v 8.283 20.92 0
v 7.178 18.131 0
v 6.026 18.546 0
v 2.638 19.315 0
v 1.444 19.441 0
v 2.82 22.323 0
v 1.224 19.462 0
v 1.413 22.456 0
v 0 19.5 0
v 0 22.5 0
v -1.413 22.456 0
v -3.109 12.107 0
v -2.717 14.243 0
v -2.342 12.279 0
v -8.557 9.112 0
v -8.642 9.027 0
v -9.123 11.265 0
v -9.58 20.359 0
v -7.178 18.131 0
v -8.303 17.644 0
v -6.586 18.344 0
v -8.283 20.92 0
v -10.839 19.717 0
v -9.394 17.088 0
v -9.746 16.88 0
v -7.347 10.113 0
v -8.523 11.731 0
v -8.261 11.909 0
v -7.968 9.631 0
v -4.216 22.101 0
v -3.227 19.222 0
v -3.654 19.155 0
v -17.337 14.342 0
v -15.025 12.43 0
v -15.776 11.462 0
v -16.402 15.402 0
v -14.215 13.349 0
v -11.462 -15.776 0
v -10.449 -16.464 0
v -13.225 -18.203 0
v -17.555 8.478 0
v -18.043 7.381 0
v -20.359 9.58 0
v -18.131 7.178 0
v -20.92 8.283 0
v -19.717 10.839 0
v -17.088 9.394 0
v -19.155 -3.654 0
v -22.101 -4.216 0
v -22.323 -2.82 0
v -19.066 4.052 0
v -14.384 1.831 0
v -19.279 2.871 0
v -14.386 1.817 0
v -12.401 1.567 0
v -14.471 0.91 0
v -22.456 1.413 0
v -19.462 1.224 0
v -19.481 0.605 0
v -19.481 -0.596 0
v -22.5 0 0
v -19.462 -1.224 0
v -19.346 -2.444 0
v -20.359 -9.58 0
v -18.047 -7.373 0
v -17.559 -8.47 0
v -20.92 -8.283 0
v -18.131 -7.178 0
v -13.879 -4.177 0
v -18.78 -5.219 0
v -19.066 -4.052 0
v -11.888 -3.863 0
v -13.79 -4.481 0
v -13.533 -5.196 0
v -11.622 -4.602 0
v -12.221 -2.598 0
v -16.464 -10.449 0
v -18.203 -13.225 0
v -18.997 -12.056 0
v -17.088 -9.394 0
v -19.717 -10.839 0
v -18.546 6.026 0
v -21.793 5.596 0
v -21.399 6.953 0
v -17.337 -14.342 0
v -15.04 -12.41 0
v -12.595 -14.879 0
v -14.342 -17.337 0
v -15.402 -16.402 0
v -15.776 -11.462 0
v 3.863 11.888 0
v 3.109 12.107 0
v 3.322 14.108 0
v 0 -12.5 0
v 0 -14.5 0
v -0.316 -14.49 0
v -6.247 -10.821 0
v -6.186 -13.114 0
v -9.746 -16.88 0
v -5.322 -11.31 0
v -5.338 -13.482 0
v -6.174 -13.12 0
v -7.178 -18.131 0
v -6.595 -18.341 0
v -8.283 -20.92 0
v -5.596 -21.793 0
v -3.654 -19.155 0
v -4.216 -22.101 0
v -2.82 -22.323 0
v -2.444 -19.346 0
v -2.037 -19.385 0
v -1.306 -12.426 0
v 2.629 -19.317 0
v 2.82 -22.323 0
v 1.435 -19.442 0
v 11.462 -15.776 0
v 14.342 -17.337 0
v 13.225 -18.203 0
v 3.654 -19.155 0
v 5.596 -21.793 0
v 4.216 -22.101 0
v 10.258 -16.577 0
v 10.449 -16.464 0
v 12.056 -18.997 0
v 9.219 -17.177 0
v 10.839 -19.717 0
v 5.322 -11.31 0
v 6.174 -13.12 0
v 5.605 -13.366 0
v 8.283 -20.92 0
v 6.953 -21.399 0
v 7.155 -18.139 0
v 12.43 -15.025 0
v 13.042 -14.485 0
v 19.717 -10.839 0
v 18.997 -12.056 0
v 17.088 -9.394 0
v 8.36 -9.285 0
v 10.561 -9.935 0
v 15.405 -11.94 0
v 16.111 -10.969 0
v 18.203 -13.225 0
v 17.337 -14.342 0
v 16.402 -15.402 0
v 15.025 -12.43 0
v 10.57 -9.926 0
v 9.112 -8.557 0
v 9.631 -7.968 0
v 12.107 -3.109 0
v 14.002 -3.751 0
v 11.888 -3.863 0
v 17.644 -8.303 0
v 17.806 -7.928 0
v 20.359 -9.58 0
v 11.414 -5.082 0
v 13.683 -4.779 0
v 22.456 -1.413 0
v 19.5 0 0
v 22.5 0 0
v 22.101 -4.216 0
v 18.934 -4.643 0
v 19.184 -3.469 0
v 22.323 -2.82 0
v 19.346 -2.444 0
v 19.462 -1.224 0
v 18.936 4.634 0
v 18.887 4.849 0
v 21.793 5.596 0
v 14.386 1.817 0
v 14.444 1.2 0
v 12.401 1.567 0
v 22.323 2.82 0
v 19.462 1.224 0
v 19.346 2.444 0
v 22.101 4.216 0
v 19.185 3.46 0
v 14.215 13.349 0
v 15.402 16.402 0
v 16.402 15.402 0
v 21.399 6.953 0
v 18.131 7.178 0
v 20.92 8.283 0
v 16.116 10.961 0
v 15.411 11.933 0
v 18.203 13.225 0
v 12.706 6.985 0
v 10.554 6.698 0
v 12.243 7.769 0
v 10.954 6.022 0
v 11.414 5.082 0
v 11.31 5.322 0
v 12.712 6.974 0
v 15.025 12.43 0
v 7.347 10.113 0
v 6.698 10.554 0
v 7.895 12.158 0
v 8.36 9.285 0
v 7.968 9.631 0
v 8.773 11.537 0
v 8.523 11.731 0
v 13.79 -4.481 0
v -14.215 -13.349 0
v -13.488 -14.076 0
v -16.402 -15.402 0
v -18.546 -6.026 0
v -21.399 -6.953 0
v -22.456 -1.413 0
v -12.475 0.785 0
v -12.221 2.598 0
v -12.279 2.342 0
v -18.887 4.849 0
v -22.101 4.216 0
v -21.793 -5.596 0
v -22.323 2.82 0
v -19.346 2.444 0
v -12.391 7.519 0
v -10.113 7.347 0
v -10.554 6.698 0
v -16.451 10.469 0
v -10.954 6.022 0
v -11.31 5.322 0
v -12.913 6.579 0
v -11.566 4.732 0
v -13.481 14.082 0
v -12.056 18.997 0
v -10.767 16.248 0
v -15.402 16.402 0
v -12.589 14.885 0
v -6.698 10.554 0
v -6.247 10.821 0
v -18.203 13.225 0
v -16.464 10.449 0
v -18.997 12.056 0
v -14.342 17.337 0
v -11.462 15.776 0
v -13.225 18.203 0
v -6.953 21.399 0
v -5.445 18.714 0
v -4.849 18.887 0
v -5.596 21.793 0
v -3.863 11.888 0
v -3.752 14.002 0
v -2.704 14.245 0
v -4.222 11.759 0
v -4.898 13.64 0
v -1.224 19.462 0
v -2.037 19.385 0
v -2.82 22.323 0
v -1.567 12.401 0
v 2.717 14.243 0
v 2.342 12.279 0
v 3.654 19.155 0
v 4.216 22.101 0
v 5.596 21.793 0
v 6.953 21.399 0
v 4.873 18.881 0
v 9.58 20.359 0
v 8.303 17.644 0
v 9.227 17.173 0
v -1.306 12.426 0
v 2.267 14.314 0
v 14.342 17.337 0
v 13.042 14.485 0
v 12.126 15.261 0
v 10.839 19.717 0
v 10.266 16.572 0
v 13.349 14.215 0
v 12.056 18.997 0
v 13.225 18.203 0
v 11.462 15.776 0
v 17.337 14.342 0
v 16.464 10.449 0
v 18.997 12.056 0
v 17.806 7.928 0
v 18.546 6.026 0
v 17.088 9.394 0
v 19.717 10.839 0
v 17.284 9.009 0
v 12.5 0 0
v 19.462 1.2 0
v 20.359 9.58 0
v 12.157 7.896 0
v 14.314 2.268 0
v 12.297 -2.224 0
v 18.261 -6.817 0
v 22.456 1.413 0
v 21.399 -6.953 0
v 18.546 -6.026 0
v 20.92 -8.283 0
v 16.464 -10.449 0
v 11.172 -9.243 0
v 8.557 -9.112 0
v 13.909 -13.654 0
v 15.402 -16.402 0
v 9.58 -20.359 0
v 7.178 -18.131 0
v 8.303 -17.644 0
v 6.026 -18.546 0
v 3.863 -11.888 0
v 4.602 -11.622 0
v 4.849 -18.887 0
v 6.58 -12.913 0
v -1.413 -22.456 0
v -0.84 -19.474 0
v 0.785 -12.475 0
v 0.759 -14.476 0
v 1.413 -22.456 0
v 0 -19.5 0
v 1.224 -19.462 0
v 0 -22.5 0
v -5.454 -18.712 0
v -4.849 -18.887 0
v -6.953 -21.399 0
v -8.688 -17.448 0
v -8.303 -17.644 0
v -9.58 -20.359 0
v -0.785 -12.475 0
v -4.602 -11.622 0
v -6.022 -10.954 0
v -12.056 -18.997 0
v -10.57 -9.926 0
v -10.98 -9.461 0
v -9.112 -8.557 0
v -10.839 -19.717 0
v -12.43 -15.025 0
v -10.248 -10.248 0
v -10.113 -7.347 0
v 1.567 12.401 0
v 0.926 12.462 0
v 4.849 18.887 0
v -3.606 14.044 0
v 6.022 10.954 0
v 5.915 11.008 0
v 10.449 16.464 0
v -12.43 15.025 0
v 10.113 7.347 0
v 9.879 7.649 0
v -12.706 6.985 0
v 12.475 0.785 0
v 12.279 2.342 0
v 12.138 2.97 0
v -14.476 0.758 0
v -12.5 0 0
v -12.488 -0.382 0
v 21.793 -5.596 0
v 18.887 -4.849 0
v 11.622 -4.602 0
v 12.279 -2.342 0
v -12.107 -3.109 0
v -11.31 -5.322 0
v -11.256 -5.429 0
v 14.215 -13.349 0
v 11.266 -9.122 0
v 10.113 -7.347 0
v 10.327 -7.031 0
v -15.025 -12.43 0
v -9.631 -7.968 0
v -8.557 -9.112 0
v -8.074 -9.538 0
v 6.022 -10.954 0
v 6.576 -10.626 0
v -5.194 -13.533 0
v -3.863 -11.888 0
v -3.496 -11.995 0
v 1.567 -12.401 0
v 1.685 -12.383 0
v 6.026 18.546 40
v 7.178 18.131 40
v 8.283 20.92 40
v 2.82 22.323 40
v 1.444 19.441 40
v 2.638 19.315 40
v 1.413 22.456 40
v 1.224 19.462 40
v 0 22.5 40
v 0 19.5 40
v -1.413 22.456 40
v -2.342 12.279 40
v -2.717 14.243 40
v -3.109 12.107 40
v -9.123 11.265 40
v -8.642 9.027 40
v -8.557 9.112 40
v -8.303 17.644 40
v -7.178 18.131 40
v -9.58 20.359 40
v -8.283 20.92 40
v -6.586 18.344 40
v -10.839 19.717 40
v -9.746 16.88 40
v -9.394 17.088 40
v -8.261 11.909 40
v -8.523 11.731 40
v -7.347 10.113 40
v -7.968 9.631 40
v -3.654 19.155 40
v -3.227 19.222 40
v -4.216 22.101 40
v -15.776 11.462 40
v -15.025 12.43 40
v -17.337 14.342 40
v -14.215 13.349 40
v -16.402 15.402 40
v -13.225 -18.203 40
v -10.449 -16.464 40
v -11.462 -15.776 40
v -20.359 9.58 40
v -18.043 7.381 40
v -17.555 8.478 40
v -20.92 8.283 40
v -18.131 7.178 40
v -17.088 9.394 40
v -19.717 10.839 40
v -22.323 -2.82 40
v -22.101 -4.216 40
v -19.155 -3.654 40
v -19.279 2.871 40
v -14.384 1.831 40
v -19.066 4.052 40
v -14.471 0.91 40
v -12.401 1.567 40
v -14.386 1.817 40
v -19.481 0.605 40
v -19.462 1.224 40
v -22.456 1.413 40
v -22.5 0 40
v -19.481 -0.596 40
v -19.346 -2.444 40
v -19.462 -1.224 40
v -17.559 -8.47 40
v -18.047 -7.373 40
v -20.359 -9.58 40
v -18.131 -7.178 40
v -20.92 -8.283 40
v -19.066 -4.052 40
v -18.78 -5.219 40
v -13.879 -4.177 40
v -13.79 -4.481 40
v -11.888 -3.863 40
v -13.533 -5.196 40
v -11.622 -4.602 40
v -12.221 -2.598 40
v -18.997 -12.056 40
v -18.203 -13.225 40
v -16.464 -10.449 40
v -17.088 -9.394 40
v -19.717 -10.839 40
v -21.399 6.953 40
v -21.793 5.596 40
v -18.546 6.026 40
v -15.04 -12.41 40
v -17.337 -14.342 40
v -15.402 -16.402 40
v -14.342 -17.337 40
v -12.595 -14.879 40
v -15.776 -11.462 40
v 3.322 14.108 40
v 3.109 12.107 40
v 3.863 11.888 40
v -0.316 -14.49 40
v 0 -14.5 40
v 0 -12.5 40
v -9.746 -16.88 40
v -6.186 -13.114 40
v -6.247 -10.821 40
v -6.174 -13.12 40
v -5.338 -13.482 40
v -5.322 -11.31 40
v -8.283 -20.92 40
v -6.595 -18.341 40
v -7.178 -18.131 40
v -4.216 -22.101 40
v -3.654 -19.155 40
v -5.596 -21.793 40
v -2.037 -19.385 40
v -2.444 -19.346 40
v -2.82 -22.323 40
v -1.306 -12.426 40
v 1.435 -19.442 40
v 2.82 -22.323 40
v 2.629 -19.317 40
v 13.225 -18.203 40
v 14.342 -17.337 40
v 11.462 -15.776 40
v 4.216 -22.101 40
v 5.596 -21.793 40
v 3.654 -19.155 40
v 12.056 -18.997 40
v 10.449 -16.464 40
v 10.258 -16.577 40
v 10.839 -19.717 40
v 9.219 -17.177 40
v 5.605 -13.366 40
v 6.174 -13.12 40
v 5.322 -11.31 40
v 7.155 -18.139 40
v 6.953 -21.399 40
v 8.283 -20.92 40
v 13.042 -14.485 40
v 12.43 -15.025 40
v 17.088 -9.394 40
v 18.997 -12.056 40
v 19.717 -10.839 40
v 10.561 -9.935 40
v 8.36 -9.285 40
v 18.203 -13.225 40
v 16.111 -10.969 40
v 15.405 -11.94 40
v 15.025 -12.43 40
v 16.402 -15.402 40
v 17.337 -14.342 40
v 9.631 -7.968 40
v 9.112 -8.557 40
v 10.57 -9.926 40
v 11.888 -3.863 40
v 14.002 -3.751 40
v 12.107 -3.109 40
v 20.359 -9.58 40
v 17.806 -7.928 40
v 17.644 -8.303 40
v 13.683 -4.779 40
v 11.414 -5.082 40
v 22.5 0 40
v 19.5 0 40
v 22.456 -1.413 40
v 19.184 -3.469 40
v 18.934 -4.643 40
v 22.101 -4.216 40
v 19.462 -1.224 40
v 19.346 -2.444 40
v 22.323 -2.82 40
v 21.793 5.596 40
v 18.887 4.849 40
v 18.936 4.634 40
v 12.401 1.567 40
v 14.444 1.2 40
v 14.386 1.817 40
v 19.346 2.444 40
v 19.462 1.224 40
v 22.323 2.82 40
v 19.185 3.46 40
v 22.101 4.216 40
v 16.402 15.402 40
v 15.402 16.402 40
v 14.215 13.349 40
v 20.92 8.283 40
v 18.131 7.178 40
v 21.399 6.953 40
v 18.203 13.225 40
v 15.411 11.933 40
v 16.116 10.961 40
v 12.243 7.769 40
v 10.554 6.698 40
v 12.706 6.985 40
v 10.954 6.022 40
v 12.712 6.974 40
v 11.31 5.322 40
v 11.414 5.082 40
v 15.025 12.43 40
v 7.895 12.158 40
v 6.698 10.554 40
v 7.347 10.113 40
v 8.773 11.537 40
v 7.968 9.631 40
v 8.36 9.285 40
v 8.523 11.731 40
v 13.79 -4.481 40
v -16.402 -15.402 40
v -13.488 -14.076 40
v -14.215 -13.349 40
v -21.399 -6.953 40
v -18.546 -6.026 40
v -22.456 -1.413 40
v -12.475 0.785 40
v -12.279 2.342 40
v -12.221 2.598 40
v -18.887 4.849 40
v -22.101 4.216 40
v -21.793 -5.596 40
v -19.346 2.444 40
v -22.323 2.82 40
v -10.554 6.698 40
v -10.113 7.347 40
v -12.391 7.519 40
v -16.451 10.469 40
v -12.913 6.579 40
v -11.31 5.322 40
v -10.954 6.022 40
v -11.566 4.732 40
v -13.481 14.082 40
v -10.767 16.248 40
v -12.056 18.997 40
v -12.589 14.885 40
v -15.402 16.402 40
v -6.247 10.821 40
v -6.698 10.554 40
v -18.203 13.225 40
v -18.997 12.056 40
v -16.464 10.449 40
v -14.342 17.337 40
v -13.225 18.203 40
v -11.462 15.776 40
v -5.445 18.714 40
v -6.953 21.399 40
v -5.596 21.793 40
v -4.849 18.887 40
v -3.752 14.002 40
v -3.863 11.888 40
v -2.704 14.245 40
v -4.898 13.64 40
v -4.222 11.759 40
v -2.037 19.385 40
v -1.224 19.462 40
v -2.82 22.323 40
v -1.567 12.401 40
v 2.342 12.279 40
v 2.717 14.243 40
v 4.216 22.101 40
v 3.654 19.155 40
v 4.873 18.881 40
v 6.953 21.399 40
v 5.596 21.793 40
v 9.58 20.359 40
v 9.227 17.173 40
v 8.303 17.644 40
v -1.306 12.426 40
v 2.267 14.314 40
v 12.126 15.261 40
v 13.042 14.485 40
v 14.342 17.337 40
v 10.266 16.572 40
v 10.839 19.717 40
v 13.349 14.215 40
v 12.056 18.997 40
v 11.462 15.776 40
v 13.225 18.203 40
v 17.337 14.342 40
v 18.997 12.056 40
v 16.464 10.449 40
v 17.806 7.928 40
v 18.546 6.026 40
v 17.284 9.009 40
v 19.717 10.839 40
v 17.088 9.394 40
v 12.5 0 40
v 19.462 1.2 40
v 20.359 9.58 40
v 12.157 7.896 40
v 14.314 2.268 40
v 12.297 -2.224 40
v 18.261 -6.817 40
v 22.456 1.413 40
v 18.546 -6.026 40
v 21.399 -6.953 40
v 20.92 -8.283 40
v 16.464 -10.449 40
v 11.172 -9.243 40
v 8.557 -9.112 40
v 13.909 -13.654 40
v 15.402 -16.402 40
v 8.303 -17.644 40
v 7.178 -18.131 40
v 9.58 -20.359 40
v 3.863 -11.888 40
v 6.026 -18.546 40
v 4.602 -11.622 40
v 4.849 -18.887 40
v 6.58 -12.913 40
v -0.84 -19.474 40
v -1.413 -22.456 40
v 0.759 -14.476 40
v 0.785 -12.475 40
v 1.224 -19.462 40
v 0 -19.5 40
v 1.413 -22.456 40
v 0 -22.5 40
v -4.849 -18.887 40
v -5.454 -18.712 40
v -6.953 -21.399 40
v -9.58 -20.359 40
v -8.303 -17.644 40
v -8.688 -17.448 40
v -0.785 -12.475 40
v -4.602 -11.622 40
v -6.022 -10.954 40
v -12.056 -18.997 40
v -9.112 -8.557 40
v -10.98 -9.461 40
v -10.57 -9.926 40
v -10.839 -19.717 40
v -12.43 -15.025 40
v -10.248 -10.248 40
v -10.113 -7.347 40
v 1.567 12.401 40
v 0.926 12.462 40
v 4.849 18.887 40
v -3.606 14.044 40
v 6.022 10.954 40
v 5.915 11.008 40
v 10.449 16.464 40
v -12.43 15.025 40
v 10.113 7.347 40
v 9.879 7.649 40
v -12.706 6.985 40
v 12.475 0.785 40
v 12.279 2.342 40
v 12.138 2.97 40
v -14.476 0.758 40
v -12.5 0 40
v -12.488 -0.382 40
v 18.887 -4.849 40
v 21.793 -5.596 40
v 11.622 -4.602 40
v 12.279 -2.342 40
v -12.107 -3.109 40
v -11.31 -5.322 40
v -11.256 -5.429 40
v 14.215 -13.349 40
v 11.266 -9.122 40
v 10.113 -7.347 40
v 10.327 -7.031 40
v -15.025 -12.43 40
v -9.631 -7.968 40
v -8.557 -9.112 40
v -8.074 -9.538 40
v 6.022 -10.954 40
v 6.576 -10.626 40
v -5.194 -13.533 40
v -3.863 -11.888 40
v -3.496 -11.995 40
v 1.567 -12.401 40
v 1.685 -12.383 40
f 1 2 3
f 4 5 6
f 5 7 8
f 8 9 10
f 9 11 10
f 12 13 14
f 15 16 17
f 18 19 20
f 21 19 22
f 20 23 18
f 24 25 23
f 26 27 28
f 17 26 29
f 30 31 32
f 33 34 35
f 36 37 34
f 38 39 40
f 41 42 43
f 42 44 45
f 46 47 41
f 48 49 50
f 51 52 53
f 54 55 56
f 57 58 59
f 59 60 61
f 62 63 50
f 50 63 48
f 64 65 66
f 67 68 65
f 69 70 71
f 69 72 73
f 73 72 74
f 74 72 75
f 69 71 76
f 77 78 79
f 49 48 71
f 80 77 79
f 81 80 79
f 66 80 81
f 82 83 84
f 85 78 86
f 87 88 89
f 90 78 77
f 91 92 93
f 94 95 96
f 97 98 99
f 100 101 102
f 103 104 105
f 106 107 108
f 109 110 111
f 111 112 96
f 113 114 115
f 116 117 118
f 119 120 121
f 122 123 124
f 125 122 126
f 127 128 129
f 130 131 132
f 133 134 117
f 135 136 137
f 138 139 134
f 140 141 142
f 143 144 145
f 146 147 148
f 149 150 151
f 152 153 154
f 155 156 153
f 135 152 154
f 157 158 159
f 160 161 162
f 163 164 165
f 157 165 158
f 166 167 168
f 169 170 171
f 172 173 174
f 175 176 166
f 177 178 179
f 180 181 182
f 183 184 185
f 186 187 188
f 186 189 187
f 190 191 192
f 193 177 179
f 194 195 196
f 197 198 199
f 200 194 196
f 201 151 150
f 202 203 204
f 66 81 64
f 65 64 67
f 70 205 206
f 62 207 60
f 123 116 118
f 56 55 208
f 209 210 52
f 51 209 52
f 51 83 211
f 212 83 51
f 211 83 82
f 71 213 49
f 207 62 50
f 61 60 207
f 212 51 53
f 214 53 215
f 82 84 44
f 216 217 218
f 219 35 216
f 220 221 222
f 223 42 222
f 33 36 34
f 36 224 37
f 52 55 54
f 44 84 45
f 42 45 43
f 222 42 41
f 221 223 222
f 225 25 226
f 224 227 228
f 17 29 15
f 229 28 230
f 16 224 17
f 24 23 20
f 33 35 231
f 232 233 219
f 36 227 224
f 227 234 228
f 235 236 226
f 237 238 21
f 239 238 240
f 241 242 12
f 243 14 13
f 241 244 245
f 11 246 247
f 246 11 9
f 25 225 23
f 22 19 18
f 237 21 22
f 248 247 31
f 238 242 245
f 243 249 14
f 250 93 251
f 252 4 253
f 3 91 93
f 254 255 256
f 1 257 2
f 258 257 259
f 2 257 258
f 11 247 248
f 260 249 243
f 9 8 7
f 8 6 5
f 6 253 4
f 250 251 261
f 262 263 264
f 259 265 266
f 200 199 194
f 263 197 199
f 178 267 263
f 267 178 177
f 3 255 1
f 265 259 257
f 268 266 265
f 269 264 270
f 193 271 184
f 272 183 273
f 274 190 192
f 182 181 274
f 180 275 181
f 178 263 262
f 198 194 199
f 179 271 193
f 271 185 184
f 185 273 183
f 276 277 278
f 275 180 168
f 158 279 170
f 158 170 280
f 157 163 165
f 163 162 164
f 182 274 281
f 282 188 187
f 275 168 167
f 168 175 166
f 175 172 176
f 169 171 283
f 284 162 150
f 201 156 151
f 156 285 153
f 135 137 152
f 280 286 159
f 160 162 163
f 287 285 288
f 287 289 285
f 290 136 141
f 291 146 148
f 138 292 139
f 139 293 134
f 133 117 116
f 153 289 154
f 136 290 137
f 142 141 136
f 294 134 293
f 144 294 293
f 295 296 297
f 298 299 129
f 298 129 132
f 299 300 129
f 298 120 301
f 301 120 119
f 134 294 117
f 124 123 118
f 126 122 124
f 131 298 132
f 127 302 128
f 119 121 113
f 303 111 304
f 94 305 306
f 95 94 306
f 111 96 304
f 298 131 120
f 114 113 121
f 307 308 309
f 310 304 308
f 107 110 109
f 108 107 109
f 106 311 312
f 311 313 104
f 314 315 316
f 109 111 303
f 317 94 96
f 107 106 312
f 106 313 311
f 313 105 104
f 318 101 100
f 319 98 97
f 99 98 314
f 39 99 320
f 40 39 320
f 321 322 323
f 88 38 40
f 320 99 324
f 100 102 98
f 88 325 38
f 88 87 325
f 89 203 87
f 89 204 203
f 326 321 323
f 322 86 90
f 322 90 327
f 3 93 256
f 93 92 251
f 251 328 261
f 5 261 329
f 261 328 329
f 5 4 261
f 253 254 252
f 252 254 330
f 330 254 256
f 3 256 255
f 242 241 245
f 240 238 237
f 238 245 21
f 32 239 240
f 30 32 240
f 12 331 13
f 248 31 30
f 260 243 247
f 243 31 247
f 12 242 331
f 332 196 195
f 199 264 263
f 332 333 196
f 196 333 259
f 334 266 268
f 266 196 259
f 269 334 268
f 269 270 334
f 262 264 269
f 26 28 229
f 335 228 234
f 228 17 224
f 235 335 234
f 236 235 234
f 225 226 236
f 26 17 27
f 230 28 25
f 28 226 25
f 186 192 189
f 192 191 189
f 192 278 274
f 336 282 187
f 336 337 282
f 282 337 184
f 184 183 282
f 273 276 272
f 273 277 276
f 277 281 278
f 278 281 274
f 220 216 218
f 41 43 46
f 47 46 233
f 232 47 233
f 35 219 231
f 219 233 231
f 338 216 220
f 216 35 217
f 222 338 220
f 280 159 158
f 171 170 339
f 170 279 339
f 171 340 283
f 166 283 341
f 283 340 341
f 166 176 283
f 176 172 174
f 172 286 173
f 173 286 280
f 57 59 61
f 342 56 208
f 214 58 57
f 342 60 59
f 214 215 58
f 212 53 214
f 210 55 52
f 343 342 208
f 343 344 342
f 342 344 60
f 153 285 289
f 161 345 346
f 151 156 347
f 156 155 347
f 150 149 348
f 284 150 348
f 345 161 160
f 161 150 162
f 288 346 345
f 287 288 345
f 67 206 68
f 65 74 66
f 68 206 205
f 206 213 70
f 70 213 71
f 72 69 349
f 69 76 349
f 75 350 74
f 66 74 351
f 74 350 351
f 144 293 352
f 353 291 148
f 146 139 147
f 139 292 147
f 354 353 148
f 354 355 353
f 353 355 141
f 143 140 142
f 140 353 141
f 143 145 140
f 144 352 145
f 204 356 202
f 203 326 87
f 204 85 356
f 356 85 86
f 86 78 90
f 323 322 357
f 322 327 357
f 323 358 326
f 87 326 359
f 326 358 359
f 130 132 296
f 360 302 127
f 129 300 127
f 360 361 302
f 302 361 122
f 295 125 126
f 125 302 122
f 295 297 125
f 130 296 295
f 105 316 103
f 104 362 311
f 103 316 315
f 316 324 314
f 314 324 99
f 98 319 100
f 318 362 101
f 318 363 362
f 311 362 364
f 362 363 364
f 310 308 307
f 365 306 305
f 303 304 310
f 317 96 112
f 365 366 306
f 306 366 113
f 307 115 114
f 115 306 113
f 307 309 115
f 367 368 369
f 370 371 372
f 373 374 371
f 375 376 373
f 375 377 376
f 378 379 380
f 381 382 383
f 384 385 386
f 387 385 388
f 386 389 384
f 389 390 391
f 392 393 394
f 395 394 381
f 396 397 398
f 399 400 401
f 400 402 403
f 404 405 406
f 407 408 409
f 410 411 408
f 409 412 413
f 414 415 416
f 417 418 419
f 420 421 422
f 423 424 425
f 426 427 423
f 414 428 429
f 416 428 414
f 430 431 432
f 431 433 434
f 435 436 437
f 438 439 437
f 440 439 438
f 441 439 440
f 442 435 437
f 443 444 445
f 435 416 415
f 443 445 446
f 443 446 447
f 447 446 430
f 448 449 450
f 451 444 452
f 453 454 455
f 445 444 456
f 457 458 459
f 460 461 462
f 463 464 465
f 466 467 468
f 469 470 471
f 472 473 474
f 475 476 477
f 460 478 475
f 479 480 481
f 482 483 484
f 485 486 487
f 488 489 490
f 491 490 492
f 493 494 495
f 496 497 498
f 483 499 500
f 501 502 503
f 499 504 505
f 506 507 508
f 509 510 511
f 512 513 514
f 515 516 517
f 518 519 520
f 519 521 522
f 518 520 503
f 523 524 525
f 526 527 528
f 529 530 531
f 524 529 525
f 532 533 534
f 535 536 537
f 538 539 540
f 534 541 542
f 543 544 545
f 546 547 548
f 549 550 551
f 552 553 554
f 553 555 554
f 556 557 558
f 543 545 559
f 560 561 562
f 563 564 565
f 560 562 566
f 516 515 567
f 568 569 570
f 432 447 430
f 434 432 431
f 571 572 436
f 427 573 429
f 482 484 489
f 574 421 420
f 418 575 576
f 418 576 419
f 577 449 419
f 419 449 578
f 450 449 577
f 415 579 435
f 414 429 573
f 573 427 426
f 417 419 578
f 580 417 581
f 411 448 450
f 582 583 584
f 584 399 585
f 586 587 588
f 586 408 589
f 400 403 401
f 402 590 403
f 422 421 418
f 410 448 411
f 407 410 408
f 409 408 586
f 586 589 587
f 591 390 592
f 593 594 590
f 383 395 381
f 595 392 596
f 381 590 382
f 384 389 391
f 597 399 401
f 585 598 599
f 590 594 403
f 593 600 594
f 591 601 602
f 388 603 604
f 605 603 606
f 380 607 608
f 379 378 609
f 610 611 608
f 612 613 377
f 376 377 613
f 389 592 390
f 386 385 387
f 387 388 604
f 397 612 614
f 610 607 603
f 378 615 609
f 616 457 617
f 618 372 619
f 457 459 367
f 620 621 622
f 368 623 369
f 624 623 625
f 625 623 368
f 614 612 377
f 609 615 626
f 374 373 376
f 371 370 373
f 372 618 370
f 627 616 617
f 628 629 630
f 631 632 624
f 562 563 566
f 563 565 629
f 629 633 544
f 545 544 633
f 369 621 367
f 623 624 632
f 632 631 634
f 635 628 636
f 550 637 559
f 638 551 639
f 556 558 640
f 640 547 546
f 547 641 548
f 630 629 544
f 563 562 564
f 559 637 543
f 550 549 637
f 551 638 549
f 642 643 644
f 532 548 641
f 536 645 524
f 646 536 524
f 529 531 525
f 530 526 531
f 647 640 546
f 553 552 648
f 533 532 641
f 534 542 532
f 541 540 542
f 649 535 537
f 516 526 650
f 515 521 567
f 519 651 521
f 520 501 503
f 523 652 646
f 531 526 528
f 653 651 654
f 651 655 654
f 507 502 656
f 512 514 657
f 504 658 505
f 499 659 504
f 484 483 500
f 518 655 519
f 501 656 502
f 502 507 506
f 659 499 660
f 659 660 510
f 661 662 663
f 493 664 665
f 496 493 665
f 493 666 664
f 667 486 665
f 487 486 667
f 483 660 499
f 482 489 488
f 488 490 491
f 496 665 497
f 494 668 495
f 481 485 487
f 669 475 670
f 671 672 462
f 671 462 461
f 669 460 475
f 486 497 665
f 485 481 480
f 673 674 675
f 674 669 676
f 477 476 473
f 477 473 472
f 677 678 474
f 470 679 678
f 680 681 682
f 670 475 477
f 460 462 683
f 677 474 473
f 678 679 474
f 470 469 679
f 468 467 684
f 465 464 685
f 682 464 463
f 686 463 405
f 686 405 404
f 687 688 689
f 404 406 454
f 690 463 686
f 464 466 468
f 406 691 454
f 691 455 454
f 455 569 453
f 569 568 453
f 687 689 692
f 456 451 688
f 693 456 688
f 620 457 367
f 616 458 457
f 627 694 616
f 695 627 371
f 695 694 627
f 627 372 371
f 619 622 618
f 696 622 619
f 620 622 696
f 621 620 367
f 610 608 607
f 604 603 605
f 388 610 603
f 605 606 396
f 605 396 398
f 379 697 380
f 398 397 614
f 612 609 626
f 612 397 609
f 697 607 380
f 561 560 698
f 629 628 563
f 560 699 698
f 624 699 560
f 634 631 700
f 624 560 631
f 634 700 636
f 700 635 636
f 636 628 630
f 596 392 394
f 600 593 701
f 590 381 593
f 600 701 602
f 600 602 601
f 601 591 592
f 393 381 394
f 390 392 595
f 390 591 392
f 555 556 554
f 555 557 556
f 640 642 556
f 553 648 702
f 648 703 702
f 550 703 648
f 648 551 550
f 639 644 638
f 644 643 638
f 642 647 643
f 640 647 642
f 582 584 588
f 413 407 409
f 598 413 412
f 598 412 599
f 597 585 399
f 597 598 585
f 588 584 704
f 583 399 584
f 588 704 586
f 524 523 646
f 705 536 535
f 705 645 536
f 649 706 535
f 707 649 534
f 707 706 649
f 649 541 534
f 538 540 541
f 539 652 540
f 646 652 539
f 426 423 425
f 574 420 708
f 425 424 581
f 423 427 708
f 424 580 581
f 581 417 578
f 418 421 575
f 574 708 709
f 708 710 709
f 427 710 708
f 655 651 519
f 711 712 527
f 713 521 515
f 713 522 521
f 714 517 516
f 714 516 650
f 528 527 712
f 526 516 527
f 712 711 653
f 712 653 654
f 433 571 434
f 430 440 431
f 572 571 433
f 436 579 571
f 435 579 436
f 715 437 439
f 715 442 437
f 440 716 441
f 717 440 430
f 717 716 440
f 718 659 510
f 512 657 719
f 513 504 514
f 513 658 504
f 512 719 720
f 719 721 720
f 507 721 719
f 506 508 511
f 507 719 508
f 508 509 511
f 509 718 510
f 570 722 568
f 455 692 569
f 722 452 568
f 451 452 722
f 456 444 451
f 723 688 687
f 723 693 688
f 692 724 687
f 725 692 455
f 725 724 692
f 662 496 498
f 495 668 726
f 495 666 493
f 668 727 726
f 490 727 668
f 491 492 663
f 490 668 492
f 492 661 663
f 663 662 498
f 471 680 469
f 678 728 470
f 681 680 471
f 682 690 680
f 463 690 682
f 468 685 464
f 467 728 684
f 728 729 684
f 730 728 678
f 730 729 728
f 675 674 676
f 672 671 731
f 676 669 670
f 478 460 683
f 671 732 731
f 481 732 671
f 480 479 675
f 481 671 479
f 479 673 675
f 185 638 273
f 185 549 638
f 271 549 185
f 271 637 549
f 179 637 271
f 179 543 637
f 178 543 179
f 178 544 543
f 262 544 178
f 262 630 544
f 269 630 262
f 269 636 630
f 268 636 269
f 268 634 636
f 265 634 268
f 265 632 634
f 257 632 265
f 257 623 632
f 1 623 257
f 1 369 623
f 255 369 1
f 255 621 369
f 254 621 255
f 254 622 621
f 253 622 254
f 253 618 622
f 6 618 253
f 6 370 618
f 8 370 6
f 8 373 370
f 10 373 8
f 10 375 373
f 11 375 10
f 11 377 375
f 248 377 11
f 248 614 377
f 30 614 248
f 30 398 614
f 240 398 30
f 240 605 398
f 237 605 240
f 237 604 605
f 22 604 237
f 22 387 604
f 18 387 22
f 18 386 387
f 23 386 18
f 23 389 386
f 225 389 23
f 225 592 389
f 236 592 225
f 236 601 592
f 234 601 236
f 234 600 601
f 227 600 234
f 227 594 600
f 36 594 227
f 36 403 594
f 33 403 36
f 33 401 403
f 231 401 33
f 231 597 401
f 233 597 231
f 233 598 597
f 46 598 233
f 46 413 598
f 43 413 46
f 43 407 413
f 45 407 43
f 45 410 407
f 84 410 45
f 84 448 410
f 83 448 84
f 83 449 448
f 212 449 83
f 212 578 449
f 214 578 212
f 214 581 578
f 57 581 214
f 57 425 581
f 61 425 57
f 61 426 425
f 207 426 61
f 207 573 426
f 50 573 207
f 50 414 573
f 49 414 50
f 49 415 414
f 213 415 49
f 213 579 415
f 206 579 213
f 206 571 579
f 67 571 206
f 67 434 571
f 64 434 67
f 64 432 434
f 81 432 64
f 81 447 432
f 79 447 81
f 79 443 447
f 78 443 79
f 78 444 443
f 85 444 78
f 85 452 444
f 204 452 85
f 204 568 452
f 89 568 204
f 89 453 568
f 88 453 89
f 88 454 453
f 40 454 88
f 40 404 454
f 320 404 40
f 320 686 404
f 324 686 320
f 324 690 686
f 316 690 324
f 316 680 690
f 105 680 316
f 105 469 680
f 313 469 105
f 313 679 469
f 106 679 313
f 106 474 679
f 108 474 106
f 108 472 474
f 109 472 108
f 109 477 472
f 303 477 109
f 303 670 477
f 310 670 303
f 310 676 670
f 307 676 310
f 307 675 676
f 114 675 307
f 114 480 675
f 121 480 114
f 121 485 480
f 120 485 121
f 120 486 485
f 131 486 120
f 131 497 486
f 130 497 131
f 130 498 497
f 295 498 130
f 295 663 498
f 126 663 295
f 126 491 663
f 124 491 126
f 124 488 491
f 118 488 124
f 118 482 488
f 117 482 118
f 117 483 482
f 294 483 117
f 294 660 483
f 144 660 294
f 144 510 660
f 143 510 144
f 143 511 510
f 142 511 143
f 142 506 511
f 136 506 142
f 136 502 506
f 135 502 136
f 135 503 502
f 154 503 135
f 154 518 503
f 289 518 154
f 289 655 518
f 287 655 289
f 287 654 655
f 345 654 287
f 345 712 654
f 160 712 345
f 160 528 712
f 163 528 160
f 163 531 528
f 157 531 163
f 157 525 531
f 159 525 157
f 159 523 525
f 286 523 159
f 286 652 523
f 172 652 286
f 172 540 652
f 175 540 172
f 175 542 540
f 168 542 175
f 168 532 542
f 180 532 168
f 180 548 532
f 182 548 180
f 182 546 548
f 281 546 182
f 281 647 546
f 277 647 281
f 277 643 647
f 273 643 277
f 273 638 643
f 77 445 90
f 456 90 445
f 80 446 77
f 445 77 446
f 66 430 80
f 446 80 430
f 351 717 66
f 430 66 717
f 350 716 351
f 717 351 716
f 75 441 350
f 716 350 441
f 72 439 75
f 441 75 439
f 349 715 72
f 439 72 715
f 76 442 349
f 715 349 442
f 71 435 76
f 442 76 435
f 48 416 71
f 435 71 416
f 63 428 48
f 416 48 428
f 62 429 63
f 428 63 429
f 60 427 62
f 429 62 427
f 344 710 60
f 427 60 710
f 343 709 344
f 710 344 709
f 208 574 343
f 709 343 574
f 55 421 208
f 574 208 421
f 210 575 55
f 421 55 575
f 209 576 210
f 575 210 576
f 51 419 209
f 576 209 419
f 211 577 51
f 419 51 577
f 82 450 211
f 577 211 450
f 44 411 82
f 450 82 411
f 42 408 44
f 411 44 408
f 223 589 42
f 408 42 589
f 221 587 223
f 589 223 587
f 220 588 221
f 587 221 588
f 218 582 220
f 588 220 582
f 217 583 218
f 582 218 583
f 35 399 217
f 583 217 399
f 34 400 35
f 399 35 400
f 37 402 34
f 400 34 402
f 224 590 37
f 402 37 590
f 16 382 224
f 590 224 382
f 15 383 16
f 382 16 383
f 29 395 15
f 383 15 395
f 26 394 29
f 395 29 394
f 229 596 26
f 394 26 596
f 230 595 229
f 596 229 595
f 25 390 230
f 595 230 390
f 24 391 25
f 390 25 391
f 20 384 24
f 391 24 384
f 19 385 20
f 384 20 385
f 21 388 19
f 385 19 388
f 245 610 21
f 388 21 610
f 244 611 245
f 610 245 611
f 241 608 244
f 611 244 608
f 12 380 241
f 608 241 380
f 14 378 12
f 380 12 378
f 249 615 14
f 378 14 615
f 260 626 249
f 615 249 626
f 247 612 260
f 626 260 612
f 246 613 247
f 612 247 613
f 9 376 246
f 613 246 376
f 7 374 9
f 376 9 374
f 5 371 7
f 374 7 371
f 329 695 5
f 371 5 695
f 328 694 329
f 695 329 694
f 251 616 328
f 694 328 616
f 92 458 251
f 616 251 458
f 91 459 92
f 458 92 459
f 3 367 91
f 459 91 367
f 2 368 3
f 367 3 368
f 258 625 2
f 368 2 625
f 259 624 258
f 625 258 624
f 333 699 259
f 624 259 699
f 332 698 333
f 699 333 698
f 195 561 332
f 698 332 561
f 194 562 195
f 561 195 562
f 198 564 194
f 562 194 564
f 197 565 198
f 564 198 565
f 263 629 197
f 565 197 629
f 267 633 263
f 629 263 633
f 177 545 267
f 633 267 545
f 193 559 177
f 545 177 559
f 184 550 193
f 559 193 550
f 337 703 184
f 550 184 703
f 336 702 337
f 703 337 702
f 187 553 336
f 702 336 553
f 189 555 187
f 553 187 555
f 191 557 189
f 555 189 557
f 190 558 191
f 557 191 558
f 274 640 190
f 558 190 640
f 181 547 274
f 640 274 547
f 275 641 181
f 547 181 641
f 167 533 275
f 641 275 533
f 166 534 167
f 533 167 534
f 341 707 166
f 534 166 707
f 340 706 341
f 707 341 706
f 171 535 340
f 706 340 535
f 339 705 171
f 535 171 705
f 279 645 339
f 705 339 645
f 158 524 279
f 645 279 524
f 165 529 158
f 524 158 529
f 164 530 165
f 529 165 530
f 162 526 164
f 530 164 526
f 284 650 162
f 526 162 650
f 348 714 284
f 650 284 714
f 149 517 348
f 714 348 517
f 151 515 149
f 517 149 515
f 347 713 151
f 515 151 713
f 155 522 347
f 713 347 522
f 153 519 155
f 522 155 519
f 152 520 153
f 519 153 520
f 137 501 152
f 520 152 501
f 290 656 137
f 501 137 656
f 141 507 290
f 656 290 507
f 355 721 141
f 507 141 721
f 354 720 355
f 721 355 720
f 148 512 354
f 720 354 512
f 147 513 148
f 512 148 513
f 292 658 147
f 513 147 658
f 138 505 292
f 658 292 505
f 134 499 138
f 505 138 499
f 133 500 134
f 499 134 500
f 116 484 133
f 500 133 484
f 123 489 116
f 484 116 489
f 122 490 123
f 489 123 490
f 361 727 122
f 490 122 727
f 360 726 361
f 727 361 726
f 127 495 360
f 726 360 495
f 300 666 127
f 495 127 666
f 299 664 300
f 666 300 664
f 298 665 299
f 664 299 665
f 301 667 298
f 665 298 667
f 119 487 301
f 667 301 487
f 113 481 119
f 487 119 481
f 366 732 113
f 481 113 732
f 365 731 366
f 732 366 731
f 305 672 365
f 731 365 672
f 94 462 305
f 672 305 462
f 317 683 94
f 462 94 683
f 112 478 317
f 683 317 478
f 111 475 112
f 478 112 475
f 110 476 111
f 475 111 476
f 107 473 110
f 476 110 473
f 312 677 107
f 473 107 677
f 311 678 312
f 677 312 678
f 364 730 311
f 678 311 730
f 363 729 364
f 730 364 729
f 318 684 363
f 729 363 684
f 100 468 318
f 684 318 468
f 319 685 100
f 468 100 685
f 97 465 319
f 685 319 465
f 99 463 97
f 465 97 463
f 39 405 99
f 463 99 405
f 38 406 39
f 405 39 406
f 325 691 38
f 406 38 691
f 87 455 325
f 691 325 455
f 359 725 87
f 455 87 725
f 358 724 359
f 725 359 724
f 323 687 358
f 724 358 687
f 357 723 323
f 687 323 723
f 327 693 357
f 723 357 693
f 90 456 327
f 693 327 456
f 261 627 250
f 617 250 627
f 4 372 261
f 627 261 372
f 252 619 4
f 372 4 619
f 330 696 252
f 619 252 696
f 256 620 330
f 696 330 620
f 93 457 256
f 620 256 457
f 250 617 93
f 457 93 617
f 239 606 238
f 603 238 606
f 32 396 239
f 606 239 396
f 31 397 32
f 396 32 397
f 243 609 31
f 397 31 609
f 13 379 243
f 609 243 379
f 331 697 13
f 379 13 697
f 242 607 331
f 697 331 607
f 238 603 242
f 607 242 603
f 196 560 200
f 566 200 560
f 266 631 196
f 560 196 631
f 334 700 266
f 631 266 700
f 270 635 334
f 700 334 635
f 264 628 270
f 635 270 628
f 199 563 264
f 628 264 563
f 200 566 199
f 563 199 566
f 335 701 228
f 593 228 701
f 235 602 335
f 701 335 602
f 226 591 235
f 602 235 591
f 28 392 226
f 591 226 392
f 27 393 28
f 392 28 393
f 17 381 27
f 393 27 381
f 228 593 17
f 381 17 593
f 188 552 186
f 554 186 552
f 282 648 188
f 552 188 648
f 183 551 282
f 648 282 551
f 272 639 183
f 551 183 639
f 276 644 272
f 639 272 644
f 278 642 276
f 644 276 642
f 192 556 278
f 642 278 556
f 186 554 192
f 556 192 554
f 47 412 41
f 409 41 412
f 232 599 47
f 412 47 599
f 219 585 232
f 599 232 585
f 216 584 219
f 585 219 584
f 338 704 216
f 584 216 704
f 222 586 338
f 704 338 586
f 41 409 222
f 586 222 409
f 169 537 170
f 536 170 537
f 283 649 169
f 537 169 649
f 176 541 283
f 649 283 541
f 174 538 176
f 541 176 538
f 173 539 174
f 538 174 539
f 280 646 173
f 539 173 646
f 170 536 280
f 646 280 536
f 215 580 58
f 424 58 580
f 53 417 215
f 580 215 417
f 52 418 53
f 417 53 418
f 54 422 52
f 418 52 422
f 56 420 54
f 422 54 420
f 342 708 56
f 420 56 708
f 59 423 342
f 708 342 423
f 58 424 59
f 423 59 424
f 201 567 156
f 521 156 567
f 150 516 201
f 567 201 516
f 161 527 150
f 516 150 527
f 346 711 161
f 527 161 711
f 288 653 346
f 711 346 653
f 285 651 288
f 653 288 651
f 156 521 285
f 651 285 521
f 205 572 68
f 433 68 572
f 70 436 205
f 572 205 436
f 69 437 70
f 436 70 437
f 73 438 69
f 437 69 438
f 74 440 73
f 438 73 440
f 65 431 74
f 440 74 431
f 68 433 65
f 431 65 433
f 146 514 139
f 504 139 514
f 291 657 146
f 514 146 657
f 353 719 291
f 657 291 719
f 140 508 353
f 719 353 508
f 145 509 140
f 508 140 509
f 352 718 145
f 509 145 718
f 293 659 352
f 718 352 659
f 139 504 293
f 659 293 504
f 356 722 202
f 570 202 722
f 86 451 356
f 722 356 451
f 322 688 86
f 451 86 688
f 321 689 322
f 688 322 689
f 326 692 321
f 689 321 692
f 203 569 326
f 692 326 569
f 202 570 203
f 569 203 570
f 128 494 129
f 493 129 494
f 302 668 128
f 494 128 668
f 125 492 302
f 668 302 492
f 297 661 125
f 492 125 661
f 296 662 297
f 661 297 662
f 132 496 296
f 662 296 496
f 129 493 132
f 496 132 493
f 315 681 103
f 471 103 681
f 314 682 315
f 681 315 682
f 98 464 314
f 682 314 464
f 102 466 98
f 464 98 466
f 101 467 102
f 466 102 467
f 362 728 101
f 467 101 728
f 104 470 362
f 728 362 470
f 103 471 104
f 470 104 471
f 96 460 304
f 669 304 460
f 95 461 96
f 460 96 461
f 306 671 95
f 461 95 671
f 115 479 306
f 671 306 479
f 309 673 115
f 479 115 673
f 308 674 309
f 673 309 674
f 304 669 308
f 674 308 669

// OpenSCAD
guideDia = 25;
fillWall=1.2;
contactWidth=3;
contactThickness=2;
gapWidth=2;
externDia = 45;
externWall = 3;
bearingHeight=40;
cutout = 0;//0-нет выреза, 1 - есть

pi = 3.141592653589793238;
$fn = 100;

//вычислим число опор с округлением в меньшую сторону
num = floor(pi*guideDia/(contactWidth+contactThickness));
//вычислим округленное расстояние между опорами
gapSum = pi*guideDia - num*contactWidth;
gapWidthRounded = gapSum / num;

contactAngle = 360*contactWidth/(pi*guideDia);
gapAngle = 360*gapWidthRounded/(pi*guideDia);
echo(contactAngle);
echo(gapWidthRounded);
/*
intersection () {

    for(angle = [0 : contactAngle+gapAngle : 360]) {
        p1 = [externDia*cos(angle),externDia*sin(angle)];
        p2 = [externDia*cos(angle+contactAngle),externDia*sin(angle+contactAngle)];
        polygon(points=[[0,0],p1,p2]);
    }

}*/

module shape () {

intersection () {
    for(angle = [0 : contactAngle+gapAngle : 360]) {
        rotate ([0,0,angle]) {
            mirror([sin(contactAngle/2),-cos(contactAngle/2),0])
            polygon(points=[[guideDia/2,0],[guideDia,0],[guideDia,fillWall],[guideDia/2,fillWall]]);
            polygon(points=[[guideDia/2,0],[guideDia,0],[guideDia,fillWall],[guideDia/2,fillWall]]);
        }
    }
    circle (r=externDia/2);
}

intersection () {
        for(angle = [0 : contactAngle+gapAngle : 360]) {
        p1 = [externDia*cos(angle),externDia*sin(angle)];
        p2 = [externDia*cos(angle+contactAngle),externDia*sin(angle+contactAngle)];
        polygon(points=[[0,0],p1,p2]);
    }
    difference() {
        circle(r=guideDia/2+contactThickness);
        circle(r=guideDia/2);

    }
}

difference() {
    circle (r=externDia/2);
    circle (r=externDia/2-externWall);
}
    
}




linear_extrude(height=bearingHeight)

if (cutout!=0) {
    difference () {
        shape();
        polygon(points=[[0,0],[externDia,0],[externDia,-externDia*sin(gapAngle)]]);
    }
} else {
    shape();
}

/*

    }*/
